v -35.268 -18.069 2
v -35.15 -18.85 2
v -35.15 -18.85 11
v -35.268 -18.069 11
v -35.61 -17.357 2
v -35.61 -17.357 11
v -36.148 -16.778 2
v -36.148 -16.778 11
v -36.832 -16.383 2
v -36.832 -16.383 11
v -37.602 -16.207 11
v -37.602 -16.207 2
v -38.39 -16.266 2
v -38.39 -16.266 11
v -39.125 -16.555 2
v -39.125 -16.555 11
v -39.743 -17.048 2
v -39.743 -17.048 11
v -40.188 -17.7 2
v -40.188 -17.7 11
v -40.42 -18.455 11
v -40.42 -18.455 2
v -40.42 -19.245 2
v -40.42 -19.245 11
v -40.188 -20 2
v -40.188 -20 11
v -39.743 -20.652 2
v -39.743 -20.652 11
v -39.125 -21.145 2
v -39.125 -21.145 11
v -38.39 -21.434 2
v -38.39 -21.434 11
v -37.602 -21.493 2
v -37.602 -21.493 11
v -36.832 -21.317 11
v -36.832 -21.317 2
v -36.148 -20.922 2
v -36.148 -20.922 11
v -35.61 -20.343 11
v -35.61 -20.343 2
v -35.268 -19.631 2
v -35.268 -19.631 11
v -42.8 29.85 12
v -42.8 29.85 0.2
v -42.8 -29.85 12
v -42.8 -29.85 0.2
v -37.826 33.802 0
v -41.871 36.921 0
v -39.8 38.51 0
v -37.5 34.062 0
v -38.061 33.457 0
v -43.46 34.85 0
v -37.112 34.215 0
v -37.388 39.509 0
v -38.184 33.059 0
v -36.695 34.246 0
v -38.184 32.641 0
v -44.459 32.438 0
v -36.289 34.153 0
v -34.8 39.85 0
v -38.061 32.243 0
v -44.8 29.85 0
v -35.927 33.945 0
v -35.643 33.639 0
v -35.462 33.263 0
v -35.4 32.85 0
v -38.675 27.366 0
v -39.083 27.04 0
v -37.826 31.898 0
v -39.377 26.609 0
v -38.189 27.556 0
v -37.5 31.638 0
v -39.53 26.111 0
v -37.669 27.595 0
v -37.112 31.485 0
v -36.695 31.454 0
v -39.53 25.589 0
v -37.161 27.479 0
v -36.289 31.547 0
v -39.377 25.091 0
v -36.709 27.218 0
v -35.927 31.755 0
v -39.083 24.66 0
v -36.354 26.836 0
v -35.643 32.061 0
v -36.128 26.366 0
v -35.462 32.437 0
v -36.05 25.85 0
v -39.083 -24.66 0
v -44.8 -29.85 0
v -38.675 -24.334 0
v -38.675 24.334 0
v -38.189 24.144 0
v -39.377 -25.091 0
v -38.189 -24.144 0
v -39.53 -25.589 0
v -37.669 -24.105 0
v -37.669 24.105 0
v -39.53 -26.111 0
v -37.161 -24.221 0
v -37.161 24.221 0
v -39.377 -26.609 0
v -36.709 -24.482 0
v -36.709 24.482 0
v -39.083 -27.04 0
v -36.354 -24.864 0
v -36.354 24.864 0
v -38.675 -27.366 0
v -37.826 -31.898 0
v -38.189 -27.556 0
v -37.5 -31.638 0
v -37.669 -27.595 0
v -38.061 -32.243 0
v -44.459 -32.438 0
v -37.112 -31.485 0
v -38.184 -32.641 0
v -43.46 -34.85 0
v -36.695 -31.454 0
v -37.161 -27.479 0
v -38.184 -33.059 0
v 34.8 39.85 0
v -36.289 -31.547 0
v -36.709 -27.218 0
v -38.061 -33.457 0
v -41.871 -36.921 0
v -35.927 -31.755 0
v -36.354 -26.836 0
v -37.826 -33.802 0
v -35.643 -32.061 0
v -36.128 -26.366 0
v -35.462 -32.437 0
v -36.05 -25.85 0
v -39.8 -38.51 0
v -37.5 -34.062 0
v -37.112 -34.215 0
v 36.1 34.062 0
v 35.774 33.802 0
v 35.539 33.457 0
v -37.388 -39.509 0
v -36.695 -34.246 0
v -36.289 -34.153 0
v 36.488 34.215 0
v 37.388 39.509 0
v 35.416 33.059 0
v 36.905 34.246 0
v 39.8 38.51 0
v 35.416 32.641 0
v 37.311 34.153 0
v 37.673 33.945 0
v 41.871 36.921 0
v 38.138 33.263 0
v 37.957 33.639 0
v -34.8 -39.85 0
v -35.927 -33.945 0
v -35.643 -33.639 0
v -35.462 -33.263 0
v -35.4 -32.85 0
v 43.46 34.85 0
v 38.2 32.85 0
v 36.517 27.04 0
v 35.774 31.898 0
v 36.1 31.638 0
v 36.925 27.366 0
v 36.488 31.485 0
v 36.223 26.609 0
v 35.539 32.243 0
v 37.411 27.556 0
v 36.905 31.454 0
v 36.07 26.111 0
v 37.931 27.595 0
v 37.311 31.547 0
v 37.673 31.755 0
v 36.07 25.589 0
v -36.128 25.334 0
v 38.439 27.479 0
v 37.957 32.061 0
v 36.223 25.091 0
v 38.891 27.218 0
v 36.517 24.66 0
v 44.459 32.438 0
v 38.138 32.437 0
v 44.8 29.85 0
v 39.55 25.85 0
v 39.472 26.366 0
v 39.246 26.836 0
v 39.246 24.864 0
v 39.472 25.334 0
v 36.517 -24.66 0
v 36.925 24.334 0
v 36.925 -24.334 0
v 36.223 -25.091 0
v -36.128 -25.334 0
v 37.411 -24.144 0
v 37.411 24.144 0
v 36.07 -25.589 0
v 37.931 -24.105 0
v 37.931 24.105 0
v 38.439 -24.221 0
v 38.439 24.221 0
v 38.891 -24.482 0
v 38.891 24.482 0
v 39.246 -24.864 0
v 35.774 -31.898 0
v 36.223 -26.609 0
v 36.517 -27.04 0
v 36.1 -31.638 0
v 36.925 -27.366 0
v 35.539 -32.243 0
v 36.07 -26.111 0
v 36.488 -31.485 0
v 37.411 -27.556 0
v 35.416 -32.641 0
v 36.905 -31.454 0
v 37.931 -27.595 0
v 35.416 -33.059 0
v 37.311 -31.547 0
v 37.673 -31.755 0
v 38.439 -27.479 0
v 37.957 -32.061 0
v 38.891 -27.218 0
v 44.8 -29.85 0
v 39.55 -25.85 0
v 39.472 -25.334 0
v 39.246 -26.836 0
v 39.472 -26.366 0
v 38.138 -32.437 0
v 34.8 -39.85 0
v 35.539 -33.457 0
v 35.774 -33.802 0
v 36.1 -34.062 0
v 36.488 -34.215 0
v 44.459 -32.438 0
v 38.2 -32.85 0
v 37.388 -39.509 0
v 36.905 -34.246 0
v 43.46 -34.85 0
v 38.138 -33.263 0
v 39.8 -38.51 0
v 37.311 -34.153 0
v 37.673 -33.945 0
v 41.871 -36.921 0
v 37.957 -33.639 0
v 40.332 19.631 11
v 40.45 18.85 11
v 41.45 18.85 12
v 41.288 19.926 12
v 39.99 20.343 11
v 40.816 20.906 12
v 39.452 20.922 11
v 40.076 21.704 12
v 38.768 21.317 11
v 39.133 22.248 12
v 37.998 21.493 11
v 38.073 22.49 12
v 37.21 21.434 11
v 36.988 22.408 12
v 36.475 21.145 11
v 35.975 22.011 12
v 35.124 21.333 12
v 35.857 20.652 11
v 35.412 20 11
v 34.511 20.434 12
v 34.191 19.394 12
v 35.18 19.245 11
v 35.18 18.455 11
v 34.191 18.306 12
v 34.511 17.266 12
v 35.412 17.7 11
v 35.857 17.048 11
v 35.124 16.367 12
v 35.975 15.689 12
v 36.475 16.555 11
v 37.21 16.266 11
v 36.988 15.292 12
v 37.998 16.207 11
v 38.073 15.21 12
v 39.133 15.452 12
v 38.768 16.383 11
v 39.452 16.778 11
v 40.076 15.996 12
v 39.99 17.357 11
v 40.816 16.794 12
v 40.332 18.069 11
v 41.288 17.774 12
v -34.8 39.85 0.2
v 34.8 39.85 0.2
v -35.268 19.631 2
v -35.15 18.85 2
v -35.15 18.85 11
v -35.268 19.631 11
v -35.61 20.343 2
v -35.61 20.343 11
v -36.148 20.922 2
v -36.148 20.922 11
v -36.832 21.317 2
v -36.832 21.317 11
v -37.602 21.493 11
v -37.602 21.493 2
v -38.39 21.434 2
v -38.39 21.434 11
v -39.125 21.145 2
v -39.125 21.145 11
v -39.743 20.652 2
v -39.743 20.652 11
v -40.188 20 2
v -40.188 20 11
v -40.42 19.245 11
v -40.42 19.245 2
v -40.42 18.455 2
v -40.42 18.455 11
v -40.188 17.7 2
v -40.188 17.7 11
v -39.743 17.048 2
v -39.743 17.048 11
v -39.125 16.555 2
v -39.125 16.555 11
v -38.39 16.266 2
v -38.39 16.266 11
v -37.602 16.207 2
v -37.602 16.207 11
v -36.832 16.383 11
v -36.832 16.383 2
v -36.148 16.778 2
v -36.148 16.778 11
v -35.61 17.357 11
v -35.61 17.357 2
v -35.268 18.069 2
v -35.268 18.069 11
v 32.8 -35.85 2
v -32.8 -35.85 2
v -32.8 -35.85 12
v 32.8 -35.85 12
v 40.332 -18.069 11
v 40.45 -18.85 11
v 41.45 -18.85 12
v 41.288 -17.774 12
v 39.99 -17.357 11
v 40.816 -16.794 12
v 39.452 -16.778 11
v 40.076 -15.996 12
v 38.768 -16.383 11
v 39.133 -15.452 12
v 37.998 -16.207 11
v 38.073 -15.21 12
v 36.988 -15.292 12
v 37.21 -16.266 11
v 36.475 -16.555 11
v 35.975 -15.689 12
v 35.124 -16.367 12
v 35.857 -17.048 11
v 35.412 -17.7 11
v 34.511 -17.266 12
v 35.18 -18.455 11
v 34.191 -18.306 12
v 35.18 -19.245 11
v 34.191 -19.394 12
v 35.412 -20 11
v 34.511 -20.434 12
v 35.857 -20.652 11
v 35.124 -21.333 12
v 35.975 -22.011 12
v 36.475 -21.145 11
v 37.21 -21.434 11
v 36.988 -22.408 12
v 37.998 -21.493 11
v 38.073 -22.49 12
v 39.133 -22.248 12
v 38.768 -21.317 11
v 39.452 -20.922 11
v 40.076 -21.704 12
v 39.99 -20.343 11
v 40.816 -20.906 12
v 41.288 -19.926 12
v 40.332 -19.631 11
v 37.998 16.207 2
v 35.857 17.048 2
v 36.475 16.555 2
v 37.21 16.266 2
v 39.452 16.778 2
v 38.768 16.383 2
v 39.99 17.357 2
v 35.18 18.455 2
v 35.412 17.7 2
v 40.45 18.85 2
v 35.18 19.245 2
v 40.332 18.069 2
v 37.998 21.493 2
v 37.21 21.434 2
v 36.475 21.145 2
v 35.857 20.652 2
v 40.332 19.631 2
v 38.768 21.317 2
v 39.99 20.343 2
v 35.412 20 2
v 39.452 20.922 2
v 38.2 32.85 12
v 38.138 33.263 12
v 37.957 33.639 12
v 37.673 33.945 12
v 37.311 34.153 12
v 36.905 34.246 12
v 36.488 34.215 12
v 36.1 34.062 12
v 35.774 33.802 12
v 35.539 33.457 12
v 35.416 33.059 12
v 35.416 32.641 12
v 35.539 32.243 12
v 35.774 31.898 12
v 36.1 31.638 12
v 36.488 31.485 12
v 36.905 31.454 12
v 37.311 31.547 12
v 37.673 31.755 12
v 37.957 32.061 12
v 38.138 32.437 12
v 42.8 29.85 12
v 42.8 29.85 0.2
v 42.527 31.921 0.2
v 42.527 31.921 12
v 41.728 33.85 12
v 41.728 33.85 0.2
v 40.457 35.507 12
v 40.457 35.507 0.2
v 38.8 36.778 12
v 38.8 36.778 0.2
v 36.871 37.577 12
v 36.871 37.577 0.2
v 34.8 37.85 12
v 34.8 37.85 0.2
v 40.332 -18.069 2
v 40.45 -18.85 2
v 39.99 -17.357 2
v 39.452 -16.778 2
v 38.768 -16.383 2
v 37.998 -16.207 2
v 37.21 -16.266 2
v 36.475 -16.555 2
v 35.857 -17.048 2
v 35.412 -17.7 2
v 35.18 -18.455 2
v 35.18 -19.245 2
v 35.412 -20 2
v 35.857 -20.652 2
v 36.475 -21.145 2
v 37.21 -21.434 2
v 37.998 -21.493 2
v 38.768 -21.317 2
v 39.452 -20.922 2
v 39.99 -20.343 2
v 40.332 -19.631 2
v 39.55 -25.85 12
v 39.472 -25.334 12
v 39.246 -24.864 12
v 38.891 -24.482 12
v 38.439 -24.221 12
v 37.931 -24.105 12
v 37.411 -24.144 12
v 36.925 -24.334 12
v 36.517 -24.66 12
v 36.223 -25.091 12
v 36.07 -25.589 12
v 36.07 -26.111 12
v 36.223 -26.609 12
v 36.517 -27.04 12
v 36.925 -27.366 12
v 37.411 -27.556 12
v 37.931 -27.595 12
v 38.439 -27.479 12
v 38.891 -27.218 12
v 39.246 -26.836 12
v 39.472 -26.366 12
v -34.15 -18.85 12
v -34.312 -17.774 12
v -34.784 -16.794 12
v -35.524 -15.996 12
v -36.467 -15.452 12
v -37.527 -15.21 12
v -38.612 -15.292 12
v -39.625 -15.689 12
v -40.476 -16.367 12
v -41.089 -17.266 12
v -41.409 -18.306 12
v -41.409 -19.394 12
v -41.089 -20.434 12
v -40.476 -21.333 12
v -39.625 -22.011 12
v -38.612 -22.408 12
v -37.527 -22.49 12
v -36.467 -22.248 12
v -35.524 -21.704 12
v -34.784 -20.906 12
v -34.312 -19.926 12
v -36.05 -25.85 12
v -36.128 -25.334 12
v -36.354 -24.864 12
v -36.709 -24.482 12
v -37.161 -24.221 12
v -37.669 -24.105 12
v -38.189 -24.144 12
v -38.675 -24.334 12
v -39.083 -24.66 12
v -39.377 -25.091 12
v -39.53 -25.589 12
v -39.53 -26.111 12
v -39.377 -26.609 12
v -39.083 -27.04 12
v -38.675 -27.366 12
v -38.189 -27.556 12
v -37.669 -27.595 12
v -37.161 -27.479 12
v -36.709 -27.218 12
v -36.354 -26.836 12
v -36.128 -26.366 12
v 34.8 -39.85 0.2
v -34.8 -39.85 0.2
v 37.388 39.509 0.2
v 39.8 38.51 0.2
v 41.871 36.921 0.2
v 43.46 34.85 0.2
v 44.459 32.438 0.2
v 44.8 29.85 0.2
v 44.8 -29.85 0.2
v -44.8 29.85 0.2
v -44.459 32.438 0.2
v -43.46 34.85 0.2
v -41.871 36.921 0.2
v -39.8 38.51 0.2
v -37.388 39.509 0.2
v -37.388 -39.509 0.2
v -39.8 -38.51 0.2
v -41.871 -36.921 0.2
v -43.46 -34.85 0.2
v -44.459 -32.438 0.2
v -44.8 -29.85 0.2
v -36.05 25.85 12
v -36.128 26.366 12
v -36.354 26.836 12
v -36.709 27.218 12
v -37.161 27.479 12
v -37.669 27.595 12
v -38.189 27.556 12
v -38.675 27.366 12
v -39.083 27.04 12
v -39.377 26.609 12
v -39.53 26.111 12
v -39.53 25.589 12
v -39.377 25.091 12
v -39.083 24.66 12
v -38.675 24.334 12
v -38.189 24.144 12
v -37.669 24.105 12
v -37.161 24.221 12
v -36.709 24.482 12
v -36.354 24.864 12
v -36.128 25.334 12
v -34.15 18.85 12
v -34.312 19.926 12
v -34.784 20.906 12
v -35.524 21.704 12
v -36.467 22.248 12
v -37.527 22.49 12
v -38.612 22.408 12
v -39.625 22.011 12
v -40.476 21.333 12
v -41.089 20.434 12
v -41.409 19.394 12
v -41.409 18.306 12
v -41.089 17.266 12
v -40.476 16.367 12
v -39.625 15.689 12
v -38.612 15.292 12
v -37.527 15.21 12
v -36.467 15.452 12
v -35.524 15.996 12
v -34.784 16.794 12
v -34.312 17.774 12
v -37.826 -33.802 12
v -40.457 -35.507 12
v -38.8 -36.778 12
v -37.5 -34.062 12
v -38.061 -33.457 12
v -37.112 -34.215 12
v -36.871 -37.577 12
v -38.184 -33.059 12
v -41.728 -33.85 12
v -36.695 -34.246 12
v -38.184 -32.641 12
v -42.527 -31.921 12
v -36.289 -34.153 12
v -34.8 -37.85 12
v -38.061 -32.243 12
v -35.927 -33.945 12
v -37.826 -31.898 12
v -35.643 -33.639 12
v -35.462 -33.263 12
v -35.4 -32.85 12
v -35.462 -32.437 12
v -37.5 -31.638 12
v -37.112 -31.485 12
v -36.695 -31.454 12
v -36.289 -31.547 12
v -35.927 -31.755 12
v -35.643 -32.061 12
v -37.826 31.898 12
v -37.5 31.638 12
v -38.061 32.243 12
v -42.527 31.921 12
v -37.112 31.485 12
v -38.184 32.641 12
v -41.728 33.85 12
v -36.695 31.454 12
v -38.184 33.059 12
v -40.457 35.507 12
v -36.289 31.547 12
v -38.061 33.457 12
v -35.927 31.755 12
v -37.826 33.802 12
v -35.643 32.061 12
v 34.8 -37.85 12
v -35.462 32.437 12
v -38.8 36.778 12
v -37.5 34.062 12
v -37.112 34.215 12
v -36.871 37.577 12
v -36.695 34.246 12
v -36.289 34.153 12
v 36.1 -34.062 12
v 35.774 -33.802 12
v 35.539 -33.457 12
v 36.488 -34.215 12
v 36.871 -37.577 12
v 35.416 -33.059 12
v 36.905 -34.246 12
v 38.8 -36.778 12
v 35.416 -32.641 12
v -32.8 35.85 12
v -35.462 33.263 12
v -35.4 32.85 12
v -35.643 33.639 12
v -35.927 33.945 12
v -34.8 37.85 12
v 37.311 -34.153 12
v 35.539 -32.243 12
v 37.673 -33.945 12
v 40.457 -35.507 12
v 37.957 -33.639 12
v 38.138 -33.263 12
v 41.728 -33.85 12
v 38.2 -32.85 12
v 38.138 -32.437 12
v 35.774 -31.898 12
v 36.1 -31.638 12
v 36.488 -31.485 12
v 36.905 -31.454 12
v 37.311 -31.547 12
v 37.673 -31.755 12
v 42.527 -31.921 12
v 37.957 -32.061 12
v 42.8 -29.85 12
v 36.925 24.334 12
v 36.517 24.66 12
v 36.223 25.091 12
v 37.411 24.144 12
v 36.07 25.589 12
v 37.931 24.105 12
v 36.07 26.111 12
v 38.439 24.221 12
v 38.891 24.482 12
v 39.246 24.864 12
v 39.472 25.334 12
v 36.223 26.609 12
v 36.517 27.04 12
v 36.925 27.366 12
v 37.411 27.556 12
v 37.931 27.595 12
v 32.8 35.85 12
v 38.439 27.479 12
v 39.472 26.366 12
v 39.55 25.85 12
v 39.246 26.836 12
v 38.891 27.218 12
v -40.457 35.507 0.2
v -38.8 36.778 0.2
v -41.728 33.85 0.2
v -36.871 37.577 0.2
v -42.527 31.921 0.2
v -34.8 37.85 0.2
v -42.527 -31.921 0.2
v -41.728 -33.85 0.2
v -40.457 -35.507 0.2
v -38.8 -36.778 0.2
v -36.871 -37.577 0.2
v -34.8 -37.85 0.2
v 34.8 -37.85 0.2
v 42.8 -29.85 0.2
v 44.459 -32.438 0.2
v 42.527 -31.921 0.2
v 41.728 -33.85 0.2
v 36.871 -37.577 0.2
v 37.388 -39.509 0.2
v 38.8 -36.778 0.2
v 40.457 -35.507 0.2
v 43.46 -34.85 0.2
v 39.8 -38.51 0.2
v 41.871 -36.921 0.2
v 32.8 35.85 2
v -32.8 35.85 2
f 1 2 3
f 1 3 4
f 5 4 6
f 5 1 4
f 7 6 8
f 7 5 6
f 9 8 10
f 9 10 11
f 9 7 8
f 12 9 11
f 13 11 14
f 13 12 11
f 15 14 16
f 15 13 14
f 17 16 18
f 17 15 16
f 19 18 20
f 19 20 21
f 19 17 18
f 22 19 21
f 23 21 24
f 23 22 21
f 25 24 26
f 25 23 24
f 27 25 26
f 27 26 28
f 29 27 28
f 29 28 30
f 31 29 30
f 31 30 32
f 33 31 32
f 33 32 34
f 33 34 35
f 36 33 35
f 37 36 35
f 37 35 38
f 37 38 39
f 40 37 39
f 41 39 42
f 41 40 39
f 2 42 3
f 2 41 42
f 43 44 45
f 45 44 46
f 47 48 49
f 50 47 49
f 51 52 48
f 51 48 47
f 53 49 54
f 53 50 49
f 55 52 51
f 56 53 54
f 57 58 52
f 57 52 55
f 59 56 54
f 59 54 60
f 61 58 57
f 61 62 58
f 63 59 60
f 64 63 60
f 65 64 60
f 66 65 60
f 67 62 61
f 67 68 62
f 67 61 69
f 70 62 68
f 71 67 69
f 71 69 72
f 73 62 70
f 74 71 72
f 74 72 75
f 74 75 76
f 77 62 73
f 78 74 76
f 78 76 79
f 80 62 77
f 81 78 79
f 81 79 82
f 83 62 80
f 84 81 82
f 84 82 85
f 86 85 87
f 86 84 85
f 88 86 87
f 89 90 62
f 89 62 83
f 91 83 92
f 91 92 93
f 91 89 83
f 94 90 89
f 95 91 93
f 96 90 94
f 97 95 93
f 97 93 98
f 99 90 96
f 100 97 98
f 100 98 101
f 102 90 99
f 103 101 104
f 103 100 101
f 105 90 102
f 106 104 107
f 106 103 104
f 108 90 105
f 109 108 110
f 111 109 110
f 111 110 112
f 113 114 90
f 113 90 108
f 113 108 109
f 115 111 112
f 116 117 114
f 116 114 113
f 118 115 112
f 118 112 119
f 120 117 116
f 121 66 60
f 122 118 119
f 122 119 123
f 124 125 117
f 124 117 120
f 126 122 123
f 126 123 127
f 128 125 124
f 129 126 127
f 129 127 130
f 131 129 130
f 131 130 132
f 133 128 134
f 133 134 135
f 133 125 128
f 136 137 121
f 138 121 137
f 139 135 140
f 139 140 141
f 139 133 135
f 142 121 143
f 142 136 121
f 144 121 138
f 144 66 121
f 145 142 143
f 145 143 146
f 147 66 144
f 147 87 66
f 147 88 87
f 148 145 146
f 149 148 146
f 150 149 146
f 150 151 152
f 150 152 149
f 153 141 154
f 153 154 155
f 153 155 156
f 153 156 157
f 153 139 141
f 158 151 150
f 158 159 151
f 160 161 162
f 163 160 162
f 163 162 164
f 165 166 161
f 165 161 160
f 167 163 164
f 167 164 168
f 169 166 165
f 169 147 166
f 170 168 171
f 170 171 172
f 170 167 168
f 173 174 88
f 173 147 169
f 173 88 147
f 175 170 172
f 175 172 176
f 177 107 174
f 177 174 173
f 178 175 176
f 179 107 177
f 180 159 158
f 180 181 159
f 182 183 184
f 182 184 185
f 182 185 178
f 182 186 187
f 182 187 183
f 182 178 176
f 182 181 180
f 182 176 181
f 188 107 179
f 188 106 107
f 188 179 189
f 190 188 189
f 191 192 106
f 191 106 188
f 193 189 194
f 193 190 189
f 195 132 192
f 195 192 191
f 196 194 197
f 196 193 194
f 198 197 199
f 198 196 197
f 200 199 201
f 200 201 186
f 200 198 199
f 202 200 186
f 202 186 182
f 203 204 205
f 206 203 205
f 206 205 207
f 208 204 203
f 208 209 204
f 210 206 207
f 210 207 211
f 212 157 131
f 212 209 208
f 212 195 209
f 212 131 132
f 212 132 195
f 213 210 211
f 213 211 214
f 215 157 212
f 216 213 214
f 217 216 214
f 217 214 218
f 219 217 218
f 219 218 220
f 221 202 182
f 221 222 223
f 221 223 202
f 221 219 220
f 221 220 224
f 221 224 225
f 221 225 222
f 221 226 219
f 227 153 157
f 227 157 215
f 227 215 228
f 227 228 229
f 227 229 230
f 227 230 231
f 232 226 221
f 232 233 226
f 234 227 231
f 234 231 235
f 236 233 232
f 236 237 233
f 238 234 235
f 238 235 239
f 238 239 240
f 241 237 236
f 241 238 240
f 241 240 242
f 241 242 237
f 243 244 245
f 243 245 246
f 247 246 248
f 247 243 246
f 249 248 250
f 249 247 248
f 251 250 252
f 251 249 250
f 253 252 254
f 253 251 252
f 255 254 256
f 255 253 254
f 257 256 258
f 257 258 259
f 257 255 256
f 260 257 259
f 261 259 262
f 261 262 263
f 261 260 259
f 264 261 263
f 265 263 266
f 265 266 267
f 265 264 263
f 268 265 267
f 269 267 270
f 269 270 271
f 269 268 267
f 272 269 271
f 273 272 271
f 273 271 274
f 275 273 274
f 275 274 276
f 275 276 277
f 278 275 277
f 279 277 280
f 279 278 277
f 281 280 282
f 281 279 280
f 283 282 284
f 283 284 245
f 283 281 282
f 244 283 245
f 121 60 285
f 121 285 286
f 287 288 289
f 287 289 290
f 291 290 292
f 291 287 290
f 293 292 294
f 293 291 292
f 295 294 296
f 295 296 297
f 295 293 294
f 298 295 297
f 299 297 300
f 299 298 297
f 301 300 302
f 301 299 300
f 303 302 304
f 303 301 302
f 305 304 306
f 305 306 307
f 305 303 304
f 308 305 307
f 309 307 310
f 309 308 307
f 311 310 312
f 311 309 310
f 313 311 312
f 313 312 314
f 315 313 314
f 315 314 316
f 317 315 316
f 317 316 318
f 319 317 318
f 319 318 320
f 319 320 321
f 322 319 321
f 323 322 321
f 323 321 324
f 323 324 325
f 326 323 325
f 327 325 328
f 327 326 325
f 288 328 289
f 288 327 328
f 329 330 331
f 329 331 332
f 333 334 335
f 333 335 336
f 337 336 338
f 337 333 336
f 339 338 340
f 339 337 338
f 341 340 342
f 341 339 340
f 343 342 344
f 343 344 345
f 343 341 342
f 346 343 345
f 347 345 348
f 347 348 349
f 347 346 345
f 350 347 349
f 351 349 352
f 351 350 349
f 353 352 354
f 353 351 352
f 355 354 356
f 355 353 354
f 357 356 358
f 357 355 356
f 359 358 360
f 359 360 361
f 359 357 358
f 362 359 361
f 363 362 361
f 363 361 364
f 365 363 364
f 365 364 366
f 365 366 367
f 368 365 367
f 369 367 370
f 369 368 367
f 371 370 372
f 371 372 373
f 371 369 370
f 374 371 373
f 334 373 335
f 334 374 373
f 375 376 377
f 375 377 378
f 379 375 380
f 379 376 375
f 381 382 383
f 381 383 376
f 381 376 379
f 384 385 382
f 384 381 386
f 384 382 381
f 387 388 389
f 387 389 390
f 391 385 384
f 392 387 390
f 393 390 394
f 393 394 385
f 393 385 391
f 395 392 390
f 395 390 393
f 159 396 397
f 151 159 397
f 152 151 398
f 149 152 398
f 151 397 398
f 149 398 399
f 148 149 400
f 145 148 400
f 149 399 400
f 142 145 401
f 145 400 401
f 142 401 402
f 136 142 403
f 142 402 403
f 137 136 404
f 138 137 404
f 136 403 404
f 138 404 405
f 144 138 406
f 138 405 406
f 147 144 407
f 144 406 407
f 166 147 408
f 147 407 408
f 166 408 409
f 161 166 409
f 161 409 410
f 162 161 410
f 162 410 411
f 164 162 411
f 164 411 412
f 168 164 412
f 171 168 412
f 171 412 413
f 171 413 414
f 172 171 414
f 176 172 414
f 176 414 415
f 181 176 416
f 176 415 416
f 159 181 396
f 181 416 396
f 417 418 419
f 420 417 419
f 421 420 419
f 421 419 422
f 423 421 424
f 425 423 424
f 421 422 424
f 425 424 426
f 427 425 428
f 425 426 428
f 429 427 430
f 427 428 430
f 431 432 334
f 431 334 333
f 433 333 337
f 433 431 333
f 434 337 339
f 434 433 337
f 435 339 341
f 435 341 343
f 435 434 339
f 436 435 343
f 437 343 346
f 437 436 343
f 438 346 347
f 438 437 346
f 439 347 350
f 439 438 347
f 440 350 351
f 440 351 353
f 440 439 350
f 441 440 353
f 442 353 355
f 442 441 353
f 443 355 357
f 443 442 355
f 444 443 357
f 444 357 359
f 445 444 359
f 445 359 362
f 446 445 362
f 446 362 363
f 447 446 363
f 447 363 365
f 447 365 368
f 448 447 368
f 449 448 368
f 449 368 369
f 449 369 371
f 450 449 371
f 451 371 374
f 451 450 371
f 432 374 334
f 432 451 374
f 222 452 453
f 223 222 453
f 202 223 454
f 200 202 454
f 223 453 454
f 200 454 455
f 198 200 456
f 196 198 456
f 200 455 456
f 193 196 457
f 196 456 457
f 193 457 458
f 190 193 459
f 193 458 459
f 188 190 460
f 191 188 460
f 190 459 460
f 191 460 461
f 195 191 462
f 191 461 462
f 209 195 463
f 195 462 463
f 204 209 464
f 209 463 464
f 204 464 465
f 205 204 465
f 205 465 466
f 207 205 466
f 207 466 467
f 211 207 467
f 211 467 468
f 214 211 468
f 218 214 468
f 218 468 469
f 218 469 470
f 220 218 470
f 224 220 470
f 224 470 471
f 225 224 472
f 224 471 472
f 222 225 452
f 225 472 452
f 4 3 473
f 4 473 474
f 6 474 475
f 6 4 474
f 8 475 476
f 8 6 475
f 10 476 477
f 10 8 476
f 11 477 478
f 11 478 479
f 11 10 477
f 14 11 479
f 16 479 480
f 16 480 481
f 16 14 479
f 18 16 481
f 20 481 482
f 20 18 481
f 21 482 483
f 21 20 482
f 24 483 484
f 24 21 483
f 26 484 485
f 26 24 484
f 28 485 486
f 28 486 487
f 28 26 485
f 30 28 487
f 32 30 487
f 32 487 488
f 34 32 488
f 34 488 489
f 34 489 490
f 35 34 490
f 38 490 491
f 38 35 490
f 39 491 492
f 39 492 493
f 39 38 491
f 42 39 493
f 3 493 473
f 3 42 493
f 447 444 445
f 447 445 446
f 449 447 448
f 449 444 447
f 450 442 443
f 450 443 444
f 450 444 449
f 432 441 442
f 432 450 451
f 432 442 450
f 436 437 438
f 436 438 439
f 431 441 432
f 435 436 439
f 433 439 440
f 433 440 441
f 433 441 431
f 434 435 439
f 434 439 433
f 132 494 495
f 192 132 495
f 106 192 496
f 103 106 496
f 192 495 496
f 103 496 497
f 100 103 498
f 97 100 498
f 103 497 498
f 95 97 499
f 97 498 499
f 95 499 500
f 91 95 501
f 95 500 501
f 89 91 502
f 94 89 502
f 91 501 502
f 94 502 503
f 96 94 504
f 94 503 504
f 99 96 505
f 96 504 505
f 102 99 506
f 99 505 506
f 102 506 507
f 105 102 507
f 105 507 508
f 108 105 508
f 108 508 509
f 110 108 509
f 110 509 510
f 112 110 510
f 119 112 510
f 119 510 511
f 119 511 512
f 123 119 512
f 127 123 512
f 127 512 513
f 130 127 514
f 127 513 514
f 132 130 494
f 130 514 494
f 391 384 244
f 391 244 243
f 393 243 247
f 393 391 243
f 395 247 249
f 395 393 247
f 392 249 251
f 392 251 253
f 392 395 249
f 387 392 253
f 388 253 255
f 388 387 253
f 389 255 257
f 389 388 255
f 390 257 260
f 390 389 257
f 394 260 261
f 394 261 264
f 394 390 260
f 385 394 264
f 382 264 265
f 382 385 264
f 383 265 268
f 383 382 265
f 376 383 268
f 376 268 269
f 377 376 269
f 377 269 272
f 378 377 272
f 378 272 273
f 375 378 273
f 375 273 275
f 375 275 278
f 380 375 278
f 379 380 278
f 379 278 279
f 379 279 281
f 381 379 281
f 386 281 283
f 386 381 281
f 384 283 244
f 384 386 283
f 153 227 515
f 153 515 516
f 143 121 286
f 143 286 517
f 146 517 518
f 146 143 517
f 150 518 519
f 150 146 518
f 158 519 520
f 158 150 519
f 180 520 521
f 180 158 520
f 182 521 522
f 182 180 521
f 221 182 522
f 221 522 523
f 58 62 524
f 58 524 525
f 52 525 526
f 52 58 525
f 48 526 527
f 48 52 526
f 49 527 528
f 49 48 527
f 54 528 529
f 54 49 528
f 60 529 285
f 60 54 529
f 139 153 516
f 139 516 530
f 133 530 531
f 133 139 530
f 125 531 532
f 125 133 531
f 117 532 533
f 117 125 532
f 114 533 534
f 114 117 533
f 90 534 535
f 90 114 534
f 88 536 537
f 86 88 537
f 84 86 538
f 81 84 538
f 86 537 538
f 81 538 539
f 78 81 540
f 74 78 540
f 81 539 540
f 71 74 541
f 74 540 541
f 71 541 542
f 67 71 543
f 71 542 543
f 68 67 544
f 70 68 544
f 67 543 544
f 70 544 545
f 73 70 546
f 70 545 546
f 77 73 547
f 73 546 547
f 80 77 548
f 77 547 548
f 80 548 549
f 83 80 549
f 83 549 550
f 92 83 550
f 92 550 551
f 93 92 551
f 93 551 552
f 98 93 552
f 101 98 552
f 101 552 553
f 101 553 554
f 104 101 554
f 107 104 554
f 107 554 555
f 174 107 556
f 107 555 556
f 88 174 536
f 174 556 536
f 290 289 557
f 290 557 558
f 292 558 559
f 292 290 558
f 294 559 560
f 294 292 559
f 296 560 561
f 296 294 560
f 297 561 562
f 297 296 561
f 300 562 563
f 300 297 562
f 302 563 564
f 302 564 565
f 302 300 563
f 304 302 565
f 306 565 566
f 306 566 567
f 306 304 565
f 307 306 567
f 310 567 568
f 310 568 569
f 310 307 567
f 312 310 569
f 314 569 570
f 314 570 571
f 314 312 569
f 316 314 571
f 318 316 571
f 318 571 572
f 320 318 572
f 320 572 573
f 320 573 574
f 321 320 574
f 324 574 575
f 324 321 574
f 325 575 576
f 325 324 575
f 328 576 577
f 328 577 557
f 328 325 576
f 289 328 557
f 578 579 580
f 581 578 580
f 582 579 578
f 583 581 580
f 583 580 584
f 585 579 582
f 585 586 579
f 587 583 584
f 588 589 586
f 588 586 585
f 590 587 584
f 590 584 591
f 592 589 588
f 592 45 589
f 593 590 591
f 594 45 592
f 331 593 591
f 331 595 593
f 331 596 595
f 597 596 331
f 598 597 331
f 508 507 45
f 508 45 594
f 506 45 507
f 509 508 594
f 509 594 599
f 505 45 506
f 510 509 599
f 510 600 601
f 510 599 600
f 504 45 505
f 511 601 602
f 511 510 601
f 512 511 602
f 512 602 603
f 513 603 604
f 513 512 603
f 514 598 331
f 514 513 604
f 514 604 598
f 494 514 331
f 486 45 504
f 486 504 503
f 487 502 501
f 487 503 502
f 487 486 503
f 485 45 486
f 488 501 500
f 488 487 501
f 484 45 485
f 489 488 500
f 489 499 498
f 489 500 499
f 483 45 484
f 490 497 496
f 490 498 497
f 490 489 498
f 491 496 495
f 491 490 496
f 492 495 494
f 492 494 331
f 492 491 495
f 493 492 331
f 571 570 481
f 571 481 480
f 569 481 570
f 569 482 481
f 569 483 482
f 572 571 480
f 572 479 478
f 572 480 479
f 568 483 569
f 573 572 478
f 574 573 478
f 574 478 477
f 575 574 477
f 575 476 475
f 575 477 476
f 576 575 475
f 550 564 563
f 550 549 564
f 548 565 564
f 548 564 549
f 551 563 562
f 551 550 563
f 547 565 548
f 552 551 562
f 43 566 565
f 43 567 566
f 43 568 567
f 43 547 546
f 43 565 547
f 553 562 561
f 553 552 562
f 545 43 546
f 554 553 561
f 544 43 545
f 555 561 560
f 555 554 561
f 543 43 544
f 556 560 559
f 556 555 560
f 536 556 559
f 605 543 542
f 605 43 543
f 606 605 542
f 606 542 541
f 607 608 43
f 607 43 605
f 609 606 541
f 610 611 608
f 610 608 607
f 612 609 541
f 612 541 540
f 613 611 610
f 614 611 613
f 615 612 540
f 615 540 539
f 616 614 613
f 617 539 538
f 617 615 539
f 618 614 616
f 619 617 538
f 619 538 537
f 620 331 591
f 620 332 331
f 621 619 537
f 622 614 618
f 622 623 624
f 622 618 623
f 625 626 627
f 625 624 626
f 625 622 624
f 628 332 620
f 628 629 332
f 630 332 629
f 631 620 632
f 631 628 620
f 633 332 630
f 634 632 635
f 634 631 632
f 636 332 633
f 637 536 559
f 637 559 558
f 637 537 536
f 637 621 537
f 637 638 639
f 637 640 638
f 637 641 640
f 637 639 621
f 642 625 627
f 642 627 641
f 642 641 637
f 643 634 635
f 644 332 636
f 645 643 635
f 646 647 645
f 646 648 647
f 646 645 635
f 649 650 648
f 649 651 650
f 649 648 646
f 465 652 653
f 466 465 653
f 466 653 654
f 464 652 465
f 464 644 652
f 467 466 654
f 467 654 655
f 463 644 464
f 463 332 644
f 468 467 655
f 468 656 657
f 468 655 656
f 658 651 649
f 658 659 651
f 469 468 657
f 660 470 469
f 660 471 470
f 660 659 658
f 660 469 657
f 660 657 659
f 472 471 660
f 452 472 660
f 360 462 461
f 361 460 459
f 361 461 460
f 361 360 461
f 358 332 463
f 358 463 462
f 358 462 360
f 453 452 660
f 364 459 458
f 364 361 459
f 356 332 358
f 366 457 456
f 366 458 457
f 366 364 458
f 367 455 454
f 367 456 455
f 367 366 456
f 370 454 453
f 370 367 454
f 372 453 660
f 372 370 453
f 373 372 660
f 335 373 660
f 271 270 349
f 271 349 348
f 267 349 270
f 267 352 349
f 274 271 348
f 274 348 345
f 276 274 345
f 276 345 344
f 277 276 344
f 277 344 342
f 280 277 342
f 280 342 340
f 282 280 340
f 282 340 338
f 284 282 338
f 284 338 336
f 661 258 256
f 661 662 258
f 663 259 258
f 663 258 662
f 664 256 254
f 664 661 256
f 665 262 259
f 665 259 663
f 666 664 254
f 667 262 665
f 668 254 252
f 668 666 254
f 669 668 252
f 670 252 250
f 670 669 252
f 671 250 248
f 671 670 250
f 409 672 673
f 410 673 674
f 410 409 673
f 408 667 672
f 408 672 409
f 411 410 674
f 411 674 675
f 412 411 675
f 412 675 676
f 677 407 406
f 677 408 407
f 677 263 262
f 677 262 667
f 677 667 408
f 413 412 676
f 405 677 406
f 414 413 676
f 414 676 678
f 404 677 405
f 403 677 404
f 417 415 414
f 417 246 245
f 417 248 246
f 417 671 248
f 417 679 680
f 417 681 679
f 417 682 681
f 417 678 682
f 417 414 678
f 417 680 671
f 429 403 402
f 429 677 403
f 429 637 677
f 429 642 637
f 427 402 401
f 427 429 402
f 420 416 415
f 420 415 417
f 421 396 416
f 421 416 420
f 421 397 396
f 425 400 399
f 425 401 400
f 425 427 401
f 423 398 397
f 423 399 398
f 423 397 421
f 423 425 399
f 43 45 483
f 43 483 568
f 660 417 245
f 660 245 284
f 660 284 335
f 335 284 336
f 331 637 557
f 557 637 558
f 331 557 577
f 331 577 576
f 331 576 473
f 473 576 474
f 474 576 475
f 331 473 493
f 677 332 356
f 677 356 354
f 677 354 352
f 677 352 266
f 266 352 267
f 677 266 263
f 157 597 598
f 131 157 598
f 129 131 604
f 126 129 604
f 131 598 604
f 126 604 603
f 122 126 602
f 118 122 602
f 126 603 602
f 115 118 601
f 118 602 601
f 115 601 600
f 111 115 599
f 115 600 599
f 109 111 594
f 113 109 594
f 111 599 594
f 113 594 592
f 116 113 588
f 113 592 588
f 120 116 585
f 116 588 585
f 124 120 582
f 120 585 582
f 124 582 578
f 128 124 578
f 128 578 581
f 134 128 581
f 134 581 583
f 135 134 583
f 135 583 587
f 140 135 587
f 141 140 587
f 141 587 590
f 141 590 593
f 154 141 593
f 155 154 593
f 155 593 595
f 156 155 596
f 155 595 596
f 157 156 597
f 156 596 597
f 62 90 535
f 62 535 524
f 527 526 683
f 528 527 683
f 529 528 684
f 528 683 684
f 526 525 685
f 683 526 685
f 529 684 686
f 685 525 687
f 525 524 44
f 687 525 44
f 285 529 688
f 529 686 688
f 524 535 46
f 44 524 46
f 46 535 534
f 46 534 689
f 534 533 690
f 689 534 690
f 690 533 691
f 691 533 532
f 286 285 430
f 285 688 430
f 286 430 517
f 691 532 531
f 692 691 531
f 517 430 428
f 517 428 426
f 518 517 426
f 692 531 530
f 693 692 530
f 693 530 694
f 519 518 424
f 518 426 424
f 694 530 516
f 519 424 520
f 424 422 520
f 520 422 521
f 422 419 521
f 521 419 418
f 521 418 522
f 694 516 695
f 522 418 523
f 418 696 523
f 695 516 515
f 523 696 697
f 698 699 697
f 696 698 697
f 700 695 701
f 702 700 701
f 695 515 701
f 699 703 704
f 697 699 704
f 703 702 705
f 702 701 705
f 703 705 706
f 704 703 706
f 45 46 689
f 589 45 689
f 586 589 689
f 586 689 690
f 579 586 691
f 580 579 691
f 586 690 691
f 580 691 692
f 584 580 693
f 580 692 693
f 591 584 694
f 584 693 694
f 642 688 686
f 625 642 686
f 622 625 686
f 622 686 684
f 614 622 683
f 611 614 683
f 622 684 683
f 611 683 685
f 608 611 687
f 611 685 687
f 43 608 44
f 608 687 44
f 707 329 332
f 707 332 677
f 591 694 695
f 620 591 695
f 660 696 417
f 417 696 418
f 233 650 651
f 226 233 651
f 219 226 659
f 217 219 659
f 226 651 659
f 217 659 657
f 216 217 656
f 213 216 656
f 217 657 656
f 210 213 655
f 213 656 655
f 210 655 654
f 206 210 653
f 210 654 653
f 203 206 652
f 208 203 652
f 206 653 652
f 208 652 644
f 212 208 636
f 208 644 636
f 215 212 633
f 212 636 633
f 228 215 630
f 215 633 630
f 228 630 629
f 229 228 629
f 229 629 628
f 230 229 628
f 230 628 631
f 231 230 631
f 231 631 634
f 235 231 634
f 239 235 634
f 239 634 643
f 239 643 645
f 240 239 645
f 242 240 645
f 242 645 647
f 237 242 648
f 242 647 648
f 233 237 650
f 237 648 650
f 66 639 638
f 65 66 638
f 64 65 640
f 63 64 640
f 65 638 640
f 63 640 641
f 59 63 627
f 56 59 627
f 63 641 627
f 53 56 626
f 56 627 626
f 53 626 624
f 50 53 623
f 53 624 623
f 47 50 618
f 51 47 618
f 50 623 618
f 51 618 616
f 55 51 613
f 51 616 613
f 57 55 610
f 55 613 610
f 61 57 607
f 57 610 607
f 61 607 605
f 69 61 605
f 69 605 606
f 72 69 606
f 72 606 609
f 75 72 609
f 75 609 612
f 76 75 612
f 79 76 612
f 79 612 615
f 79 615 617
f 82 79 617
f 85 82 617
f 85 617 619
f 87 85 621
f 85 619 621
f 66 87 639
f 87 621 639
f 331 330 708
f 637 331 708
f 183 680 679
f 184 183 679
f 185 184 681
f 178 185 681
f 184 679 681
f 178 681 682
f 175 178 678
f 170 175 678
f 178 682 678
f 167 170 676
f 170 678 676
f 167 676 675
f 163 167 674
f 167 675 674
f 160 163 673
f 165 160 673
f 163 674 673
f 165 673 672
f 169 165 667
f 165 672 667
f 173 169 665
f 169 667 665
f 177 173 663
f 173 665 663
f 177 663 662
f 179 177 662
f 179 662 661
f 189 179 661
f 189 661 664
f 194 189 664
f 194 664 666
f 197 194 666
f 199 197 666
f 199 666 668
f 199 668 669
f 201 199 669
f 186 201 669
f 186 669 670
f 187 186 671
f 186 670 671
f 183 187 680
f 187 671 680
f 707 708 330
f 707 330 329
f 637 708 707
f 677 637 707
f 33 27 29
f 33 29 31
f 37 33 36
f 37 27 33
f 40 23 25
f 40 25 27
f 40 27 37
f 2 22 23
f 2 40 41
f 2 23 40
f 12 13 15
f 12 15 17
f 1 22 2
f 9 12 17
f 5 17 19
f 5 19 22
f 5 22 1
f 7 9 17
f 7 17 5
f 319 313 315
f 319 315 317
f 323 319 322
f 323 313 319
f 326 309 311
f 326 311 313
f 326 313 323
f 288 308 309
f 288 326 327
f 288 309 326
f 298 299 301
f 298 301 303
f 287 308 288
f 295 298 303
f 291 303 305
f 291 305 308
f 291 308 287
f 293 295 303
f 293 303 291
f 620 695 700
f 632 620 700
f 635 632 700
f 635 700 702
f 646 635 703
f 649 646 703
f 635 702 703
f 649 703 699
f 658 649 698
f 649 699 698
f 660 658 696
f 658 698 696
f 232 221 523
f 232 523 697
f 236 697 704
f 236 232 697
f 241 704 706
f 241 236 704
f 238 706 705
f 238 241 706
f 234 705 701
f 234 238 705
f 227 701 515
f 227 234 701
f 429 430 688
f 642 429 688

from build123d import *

# Parameters (mm, degrees)
F1_DEPTH = 2
F2_R     = 2.65
F2_W     = 65.6
F2_H     = 71.7
F3_DEPTH = 10
F4_R     = 1.4
F4_R_2   = 1.75
F5_DEPTH = 12
F6_SIZE  = 1
F8_DEPTH = 0.2


with BuildPart() as f1:
    # F0 (on Top) → F1 (new body)
    with BuildSketch(Plane.XY):
        with BuildLine():
            Line((34.8, 37.85), (-34.8, 37.85))
            ThreePointArc((-34.8, 37.85), (-40.456854, 35.506854), (-42.8, 29.85))
            Line((-42.8, 29.85), (-42.8, -29.85))
            ThreePointArc((-42.8, -29.85), (-40.456854, -35.506854), (-34.8, -37.85))
            Line((-34.8, -37.85), (34.8, -37.85))
            ThreePointArc((34.8, -37.85), (40.456854, -35.506854), (42.8, -29.85))
            Line((42.8, -29.85), (42.8, 29.85))
            ThreePointArc((42.8, 29.85), (40.456854, 35.506854), (34.8, 37.85))
        make_face()
    extrude(amount=F1_DEPTH)

    # F2 (on face) → F3 (join)
    with BuildSketch(Plane.XY.offset(2)):
        with BuildLine():
            ThreePointArc((-34.8, 37.85), (-40.456854, 35.506854), (-42.8, 29.85))
            Line((-42.8, 29.85), (-42.8, -29.85))
            ThreePointArc((-42.8, -29.85), (-40.456854, -35.506854), (-34.8, -37.85))
            Line((-34.8, -37.85), (34.8, -37.85))
            ThreePointArc((34.8, -37.85), (40.456854, -35.506854), (42.8, -29.85))
            Line((42.8, -29.85), (42.8, 29.85))
            ThreePointArc((42.8, 29.85), (40.456854, 35.506854), (34.8, 37.85))
            Line((34.8, 37.85), (-34.8, 37.85))
        make_face()
        with Locations((-37.8, -18.85)):
            Circle(F2_R, mode=Mode.SUBTRACT)
        with Locations((37.8, -18.85)):
            Circle(F2_R, mode=Mode.SUBTRACT)
        with Locations((-37.8, 18.85)):
            Circle(F2_R, mode=Mode.SUBTRACT)
        Rectangle(F2_W, F2_H, mode=Mode.SUBTRACT)
        with Locations((37.8, 18.85)):
            Circle(F2_R, mode=Mode.SUBTRACT)
    extrude(amount=F3_DEPTH)

    # F4 (on face) → F5 (cut, through all)
    with BuildSketch(Plane.XY.offset(12)):
        with Locations((-36.8, -32.85)):
            Circle(F4_R)
        with Locations((36.8, -32.85)):
            Circle(F4_R)
        with Locations((-36.8, 32.85)):
            Circle(F4_R)
        with Locations((36.8, 32.85)):
            Circle(F4_R)
        with Locations((-37.8, -25.85)):
            Circle(F4_R_2)
        with Locations((37.8, -25.85)):
            Circle(F4_R_2)
        with Locations((-37.8, 25.85)):
            Circle(F4_R_2)
        with Locations((37.8, 25.85)):
            Circle(F4_R_2)
    extrude(amount=-F5_DEPTH, mode=Mode.SUBTRACT)

    # F6
    f6_edges = [f1.edges().sort_by_distance(p)[0] for p in [
        (-40.45, 18.85, 12),
        (35.15, 18.85, 12),
        (35.15, -18.85, 12),
        (-40.45, -18.85, 12),
    ]]
    chamfer(f6_edges, length=F6_SIZE)

    # F7 (on face) → F8 (join)
    with BuildSketch(Plane(origin=(0, 0, 0), x_dir=(1, 0, 0), z_dir=(0, 0, -1))):
        with BuildLine():
            Line((34.8, 39.85), (-34.8, 39.85))
            ThreePointArc((-34.8, 39.85), (-41.871068, 36.921068), (-44.8, 29.85))
            Line((-44.8, 29.85), (-44.8, -29.85))
            ThreePointArc((-44.8, -29.85), (-41.871068, -36.921068), (-34.8, -39.85))
            Line((-34.8, -39.85), (34.8, -39.85))
            ThreePointArc((34.8, -39.85), (41.871068, -36.921068), (44.8, -29.85))
            Line((44.8, -29.85), (44.8, 29.85))
            ThreePointArc((44.8, 29.85), (41.871068, 36.921068), (34.8, 39.85))
        make_face()
        with BuildLine():
            Line((-42.8, -29.85), (-42.8, 29.85))
            ThreePointArc((-42.8, 29.85), (-40.456854, 35.506854), (-34.8, 37.85))
            Line((-34.8, 37.85), (34.8, 37.85))
            ThreePointArc((34.8, 37.85), (40.456854, 35.506854), (42.8, 29.85))
            Line((42.8, 29.85), (42.8, -29.85))
            ThreePointArc((42.8, -29.85), (40.456854, -35.506854), (34.8, -37.85))
            Line((34.8, -37.85), (-34.8, -37.85))
            ThreePointArc((-34.8, -37.85), (-40.456854, -35.506854), (-42.8, -29.85))
        make_face(mode=Mode.SUBTRACT)
    extrude(amount=-F8_DEPTH)


solid = f1.part
